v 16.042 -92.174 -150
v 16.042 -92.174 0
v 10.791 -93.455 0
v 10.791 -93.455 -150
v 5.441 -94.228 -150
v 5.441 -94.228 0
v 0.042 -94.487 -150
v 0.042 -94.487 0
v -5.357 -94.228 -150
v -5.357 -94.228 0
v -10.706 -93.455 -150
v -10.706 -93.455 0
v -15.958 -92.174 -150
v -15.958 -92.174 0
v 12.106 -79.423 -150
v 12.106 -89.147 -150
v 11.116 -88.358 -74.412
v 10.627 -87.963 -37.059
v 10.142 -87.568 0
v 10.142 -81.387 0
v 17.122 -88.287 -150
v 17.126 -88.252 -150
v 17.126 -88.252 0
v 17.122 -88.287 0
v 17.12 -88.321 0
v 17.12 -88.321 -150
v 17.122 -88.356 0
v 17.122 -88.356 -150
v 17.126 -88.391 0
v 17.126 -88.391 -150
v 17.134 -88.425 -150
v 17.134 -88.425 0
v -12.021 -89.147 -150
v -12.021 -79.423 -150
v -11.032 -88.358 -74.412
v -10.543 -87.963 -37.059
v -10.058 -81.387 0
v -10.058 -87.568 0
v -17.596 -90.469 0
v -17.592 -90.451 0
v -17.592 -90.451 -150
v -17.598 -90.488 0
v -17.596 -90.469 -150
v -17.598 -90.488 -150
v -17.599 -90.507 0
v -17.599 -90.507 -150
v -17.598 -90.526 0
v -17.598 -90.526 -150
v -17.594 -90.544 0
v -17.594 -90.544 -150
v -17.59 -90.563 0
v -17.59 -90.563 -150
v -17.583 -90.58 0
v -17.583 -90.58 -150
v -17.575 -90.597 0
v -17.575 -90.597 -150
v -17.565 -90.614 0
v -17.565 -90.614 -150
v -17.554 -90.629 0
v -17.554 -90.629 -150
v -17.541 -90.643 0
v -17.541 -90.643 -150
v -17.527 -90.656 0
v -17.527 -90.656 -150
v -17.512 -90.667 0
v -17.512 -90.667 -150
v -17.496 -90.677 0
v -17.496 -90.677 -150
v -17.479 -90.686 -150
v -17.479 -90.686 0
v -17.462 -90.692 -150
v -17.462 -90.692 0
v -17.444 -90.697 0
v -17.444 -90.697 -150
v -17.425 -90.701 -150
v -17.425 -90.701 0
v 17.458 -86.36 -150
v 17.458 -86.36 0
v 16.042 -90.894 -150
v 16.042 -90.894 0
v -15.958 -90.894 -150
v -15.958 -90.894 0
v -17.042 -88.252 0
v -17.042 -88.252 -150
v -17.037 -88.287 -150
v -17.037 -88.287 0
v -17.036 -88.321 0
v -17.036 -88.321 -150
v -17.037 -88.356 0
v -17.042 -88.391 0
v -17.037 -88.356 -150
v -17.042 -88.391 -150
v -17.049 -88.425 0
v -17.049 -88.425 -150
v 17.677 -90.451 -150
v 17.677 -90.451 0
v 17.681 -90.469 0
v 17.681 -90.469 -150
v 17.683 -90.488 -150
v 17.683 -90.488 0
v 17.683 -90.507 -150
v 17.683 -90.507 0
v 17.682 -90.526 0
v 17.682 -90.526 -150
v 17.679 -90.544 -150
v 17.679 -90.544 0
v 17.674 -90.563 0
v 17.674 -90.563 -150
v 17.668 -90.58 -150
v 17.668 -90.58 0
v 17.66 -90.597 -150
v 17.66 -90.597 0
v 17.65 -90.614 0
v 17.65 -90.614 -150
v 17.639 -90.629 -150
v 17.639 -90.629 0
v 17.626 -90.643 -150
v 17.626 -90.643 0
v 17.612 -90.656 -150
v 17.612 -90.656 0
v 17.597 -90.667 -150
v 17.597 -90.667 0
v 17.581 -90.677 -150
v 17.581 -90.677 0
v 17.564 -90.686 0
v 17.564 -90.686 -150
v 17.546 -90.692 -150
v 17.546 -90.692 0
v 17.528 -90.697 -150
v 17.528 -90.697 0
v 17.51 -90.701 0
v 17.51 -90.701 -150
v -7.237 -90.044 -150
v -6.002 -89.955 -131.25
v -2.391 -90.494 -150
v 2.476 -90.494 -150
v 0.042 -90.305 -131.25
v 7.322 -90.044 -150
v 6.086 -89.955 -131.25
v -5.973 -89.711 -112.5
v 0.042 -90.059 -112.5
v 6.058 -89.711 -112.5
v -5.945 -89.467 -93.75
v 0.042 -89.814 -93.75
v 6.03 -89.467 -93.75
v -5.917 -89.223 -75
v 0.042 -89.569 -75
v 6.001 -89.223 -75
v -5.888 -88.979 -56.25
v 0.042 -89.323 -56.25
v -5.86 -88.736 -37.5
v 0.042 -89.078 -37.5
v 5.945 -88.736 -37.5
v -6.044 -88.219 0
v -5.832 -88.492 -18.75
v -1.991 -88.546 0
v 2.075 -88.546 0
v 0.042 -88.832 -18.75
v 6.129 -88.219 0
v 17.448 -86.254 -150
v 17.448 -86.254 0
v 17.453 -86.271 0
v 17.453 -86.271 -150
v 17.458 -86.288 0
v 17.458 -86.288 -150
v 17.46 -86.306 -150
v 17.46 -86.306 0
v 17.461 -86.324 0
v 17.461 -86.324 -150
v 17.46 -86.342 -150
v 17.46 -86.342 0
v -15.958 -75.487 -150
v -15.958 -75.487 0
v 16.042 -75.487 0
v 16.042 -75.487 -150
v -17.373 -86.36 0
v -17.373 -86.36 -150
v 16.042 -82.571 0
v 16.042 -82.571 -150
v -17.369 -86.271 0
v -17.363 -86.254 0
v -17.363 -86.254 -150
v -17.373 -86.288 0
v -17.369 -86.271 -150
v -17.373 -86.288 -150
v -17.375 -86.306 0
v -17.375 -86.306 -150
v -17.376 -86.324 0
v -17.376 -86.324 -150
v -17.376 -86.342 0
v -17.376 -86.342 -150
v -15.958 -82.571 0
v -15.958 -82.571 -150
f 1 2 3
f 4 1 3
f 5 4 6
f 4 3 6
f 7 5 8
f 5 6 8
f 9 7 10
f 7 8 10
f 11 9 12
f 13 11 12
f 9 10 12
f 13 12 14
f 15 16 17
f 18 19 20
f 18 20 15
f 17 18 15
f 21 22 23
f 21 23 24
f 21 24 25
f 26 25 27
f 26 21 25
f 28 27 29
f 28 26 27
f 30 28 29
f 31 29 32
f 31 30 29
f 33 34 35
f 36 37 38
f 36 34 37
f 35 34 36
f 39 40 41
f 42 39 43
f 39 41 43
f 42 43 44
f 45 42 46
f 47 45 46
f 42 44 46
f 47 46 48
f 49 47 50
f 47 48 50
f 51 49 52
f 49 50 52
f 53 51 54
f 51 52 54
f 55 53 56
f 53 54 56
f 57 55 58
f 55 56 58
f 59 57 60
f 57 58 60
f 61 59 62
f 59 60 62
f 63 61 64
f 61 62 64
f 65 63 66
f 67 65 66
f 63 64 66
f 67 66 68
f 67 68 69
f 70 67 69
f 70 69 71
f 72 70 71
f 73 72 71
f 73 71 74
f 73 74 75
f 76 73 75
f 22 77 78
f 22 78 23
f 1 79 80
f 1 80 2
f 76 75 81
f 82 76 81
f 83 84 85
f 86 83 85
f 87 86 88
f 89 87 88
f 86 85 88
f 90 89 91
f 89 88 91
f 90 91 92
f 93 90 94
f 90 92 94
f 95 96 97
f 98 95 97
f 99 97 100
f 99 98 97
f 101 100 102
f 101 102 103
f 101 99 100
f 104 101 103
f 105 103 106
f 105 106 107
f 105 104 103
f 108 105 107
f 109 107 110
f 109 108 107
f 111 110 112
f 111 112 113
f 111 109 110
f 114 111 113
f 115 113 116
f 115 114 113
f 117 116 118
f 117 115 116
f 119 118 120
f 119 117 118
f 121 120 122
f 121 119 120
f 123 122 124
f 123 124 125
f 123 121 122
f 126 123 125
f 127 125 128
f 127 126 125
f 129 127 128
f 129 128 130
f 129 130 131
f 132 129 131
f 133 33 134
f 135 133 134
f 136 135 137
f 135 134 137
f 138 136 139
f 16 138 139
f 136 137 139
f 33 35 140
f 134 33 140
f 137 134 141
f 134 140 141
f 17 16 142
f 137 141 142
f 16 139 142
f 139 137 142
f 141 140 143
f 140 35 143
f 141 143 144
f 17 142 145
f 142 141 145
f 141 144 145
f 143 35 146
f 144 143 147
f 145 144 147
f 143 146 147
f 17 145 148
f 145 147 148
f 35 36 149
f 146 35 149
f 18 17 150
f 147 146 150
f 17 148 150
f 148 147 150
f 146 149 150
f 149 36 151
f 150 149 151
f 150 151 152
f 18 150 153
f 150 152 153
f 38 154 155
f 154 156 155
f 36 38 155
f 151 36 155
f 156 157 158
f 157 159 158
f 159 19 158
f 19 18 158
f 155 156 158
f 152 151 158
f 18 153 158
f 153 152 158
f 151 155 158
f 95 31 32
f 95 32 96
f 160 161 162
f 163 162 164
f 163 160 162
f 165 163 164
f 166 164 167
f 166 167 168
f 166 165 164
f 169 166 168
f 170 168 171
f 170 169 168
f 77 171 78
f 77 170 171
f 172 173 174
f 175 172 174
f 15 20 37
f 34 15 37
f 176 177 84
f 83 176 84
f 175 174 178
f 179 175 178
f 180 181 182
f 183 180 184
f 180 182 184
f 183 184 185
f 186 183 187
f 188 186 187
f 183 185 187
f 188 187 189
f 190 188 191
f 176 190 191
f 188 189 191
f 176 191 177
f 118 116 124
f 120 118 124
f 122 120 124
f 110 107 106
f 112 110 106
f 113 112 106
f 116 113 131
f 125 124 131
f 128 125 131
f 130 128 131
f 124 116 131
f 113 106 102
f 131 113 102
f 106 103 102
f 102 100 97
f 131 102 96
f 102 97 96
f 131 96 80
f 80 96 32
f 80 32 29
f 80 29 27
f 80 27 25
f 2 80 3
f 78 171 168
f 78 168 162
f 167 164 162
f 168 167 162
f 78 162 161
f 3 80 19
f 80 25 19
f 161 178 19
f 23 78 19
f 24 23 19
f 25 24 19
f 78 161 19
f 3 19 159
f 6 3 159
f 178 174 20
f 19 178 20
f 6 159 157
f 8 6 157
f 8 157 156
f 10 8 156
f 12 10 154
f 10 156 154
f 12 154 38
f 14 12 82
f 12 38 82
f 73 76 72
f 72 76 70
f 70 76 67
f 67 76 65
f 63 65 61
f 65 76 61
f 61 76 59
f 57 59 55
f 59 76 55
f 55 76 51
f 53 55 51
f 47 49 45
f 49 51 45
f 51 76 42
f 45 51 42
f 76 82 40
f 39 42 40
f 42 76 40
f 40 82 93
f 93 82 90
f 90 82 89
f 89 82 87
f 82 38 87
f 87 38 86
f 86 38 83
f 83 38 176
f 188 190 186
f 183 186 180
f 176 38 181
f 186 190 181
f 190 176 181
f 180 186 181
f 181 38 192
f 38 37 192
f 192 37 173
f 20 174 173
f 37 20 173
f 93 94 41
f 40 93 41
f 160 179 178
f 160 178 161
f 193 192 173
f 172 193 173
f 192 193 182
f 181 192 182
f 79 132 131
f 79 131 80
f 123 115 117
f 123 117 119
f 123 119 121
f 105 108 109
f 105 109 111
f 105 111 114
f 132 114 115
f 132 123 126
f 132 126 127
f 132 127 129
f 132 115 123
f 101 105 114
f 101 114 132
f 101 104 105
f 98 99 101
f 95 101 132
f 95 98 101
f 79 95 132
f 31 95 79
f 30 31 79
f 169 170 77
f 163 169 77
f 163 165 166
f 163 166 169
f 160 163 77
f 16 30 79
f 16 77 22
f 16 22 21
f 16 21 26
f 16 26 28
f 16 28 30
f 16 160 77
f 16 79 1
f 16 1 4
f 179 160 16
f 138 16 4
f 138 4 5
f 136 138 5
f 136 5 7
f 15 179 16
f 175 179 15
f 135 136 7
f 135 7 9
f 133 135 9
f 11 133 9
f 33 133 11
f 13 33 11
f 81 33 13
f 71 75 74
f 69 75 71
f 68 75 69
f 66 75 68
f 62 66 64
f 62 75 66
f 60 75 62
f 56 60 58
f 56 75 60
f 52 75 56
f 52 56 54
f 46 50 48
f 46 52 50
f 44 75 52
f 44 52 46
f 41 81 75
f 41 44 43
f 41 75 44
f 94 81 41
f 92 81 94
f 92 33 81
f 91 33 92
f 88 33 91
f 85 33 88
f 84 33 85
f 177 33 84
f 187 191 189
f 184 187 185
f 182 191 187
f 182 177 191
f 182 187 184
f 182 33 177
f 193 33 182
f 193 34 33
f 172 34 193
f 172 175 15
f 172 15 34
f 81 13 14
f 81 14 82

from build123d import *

# Parameters (mm, degrees)
BOSS_EXTRUDE2_DEPTH = 150
CUT_EXTRUDE1_DEPTH  = 179.003087993
CUT_EXTRUDE1_DRAFT  = 0.75
BOSS_EXTRUDE3_DEPTH = 150


with BuildPart() as part:
    # Sketch1 → Boss-Extrude2 (new body)
    with BuildSketch(Plane.XY):
        with BuildLine():
            Line((-15.957671772, -92.173910335), (-15.957671772, -75.48673473))
            Line((-15.957671772, -75.48673473), (16.042328228, -75.48673473))
            Line((16.042328228, -75.48673473), (16.042328228, -92.173910335))
            ThreePointArc((16.042328228, -92.173910335), (0.042328228, -94.48673473), (-15.957671772, -92.173910335))
        make_face()
    extrude(amount=-BOSS_EXTRUDE2_DEPTH)


with BuildPart() as cut_extrude1_tool:
    # Sketch4 → Cut-Extrude1 (with draft: the straight prism first)
    with BuildSketch(Plane.XY):
        with BuildLine():
            Line((10.142328228, -87.568485405), (10.142328228, -81.38673473))
            Line((10.142328228, -81.38673473), (-10.057671772, -81.38673473))
            Line((-10.057671772, -81.38673473), (-10.057671772, -87.568485405))
            ThreePointArc((-10.057671772, -87.568485405), (0.042328228, -88.58673473), (10.142328228, -87.568485405))
        make_face()
    extrude(amount=-CUT_EXTRUDE1_DEPTH)
    # Cut-Extrude1: the draft: its side faces are tilted about the plane it starts from
    cut_extrude1_sides = [cut_extrude1_tool.faces().sort_by_distance(p)[0] for p in [
        (0.042328228, -88.58673473, -89.501543996),
        (10.142328228, -84.477610068, -89.501543996),
        (0.042328228, -81.38673473, -89.501543996),
        (-10.057671772, -84.477610068, -89.501543996),
    ]]
    draft(cut_extrude1_sides, Plane.XY, CUT_EXTRUDE1_DRAFT)


with BuildPart() as part_1:
    add(part.part)

    # Cut-Extrude1: cut by cut_extrude1_tool
    add(cut_extrude1_tool.part, mode=Mode.SUBTRACT)

    # Sketch5 → Boss-Extrude3 (add)
    with BuildSketch(Plane(origin=(0, 0, -150), x_dir=(-1, 0, 0), z_dir=(0, 0, -1))):
        with BuildLine():
            Line((-17.509626323, -90.700736876), (-16.042328228, -90.893910335))
            Line((-16.042328228, -90.893910335), (-16.042328228, -82.570693355))
            Line((-16.042328228, -82.570693355), (-17.447829646, -86.253845746))
            ThreePointArc((-17.447829646, -86.253845746), (-17.46006126, -86.306080257), (-17.457968161, -86.359686931))
            Line((-17.457968161, -86.359686931), (-17.126211232, -88.252050567))
            ThreePointArc((-17.126211232, -88.252050567), (-17.120591762, -88.338766729), (-17.133832096, -88.424650167))
            Line((-17.133832096, -88.424650167), (-17.67670625, -90.450684094))
            ThreePointArc((-17.67670625, -90.450684094), (-17.649815007, -90.61356195), (-17.509626323, -90.700736876))
        make_face()
        with BuildLine():
            Line((15.957671772, -90.893910335), (15.957671772, -82.570693355))
            Line((15.957671772, -82.570693355), (17.36317319, -86.253845746))
            ThreePointArc((17.36317319, -86.253845746), (17.375404804, -86.306080257), (17.373311704, -86.359686931))
            Line((17.373311704, -86.359686931), (17.041554775, -88.252050567))
            ThreePointArc((17.041554775, -88.252050567), (17.035935306, -88.338766729), (17.049175639, -88.424650167))
            Line((17.049175639, -88.424650167), (17.592049794, -90.450684094))
            ThreePointArc((17.592049794, -90.450684094), (17.565158551, -90.61356195), (17.424969867, -90.700736876))
            Line((17.424969867, -90.700736876), (15.957671772, -90.893910335))
        make_face()
    extrude(amount=-BOSS_EXTRUDE3_DEPTH)


solid = part_1.part
